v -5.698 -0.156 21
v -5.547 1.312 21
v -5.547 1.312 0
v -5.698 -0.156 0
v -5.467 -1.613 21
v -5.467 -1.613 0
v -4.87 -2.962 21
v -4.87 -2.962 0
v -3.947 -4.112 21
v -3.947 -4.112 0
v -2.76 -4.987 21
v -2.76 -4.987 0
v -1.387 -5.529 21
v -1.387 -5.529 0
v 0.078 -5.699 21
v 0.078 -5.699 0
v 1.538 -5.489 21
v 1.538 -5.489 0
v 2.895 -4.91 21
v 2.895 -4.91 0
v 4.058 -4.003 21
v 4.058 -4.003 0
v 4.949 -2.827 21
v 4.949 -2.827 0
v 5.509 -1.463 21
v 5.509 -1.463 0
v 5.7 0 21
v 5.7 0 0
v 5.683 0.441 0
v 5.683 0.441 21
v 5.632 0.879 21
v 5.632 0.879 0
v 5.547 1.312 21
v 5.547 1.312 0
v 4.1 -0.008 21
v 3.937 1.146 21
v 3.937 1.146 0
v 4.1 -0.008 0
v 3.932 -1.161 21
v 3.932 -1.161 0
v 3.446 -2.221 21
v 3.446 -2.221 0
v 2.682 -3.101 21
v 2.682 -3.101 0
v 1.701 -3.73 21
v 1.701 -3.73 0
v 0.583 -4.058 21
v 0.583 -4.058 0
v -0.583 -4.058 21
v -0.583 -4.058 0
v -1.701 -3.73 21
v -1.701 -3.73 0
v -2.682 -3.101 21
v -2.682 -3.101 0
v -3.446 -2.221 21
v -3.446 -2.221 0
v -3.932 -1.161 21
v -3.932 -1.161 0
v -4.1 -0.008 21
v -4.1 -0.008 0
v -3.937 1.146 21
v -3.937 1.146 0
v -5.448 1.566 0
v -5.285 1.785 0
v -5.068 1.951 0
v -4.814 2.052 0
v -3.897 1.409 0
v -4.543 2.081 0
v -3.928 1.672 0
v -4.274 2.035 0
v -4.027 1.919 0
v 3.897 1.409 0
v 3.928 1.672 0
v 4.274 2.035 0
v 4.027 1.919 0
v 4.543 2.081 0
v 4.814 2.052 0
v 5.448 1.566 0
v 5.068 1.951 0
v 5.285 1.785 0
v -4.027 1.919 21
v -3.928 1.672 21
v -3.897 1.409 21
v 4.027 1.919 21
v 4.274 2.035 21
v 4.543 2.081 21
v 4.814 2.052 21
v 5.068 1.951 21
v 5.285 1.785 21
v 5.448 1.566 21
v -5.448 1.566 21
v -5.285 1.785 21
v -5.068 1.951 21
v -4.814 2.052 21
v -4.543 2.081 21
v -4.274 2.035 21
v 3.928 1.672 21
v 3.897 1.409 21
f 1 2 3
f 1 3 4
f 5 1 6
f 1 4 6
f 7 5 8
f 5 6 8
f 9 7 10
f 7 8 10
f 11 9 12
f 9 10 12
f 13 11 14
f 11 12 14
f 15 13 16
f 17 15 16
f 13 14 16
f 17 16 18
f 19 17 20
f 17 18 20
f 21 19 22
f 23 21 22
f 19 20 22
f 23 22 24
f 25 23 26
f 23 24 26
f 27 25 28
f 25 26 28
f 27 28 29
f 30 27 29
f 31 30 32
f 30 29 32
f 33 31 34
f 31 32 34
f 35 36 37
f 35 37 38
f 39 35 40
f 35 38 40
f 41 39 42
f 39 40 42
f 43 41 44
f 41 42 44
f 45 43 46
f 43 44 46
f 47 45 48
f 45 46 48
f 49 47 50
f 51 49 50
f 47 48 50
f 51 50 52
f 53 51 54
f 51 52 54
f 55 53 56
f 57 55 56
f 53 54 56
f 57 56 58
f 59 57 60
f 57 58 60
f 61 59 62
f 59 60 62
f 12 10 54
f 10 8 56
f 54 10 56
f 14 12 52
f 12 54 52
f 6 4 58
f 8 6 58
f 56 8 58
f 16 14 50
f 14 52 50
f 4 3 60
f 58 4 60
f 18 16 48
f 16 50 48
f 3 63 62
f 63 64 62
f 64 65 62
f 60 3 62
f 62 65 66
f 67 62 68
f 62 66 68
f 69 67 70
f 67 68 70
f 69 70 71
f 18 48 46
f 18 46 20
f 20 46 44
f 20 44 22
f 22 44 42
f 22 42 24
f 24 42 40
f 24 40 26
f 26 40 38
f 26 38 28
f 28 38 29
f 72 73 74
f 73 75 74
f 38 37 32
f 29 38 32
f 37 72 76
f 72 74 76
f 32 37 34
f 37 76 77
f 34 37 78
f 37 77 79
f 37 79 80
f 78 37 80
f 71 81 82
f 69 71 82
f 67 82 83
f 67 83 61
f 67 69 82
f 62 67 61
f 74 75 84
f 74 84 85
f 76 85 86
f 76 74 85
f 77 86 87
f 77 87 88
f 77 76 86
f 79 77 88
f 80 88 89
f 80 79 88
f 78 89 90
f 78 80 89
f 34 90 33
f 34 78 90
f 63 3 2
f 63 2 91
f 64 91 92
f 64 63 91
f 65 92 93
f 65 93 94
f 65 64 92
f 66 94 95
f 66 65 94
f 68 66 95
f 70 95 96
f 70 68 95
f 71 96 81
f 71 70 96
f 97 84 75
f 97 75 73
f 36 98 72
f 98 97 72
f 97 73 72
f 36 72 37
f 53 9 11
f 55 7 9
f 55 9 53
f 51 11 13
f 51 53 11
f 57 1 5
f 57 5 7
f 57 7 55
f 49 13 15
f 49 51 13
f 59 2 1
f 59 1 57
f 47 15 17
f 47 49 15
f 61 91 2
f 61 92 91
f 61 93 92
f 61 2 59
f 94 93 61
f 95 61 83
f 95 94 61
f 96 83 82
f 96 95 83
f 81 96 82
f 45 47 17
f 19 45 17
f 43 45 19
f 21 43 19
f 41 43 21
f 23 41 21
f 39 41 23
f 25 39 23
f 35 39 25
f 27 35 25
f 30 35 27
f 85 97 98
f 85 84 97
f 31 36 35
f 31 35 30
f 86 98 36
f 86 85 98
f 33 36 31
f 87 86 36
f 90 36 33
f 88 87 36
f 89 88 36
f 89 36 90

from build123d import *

# Parameters (mm, degrees)
F1_DEPTH    = 21
F2_T1_DEPTH = 23.8690975764
F2_T3_DEPTH = 30.409576176


# Not quite as in the source:
# - a fillet or chamfer that OpenCascade refuses, or shapes differently, is made with other operations: its cross-section is extruded or revolved along the edge and cut away or added


with BuildPart() as f1:
    # F0 (on Top) → F1 (new body)
    with BuildSketch(Plane.XY):
        with BuildLine():
            ThreePointArc((3.7440062904, 1.6710526316), (4.0100140767, 0.8542757779), (4.1, 0))
            ThreePointArc((4.1, 0), (-0.8542757779, -4.0100140767), (-3.7440062904, 1.6710526316))
            ThreePointArc((-3.7440062904, 1.6710526316), (-4.335673559, 2.3159292575), (-4.8175607103, 3.0464912281))
            ThreePointArc((-4.8175607103, 3.0464912281), (-1.5858600114, -5.4749473079), (5.7, 0))
            ThreePointArc((5.7, 0), (5.4749473079, 1.5858600114), (4.8175607103, 3.0464912281))
            ThreePointArc((4.8175607103, 3.0464912281), (4.335673559, 2.3159292575), (3.7440062904, 1.6710526316))
        make_face()
    extrude(amount=F1_DEPTH)

    # F2: fillet of radius 1 on 4 edges, made by hand

    # F2_s2 → F2_t1 (cut)
    with BuildSketch(Plane.XY.offset(-1.4345487882)):
        with BuildLine():
            ThreePointArc((-4.1434007569, 2.0830634278), (-3.9202406694, 1.6409302608), (-3.9366000062, 1.1459408325))
            ThreePointArc((-3.9366000062, 1.1459408325), (-3.8492679656, 1.4117847318), (-3.7440062904, 1.6710526316))
            ThreePointArc((-3.7440062904, 1.6710526316), (-3.9490803621, 1.8718458373), (-4.1434007569, 2.0830634278))
        make_face()
        with BuildLine():
            ThreePointArc((4.1434007569, 2.0830634278), (3.9202406694, 1.6409302608), (3.9366000062, 1.1459408325))
            ThreePointArc((3.9366000062, 1.1459408325), (3.8492679656, 1.4117847318), (3.7440062904, 1.6710526316))
            ThreePointArc((3.7440062904, 1.6710526316), (3.9490803621, 1.8718458373), (4.1434007569, 2.0830634278))
        make_face()
    extrude(amount=F2_T1_DEPTH, mode=Mode.SUBTRACT)

    # F2_s4 → F2_t3 (cut)
    with BuildSketch(Plane.XY.offset(-4.704788088)):
        with BuildLine():
            ThreePointArc((-5.5470205992, 1.3117021277), (-4.849273554, 2.0429045287), (-3.8701884613, 1.7921052632))
            ThreePointArc((-3.8701884613, 1.7921052632), (-4.3889198505, 2.3852779082), (-4.8175607103, 3.0464912281))
            ThreePointArc((-4.8175607103, 3.0464912281), (-5.2543800525, 2.2094094831), (-5.5470205992, 1.3117021277))
        make_face()
        with BuildLine():
            ThreePointArc((3.8701884613, 1.7921052632), (4.849273554, 2.0429045287), (5.5470205992, 1.3117021277))
            ThreePointArc((5.5470205992, 1.3117021277), (5.2543800525, 2.2094094831), (4.8175607103, 3.0464912281))
            ThreePointArc((4.8175607103, 3.0464912281), (4.3889198505, 2.3852779082), (3.8701884613, 1.7921052632))
        make_face()
    extrude(amount=F2_T3_DEPTH, mode=Mode.SUBTRACT)


solid = f1.part
